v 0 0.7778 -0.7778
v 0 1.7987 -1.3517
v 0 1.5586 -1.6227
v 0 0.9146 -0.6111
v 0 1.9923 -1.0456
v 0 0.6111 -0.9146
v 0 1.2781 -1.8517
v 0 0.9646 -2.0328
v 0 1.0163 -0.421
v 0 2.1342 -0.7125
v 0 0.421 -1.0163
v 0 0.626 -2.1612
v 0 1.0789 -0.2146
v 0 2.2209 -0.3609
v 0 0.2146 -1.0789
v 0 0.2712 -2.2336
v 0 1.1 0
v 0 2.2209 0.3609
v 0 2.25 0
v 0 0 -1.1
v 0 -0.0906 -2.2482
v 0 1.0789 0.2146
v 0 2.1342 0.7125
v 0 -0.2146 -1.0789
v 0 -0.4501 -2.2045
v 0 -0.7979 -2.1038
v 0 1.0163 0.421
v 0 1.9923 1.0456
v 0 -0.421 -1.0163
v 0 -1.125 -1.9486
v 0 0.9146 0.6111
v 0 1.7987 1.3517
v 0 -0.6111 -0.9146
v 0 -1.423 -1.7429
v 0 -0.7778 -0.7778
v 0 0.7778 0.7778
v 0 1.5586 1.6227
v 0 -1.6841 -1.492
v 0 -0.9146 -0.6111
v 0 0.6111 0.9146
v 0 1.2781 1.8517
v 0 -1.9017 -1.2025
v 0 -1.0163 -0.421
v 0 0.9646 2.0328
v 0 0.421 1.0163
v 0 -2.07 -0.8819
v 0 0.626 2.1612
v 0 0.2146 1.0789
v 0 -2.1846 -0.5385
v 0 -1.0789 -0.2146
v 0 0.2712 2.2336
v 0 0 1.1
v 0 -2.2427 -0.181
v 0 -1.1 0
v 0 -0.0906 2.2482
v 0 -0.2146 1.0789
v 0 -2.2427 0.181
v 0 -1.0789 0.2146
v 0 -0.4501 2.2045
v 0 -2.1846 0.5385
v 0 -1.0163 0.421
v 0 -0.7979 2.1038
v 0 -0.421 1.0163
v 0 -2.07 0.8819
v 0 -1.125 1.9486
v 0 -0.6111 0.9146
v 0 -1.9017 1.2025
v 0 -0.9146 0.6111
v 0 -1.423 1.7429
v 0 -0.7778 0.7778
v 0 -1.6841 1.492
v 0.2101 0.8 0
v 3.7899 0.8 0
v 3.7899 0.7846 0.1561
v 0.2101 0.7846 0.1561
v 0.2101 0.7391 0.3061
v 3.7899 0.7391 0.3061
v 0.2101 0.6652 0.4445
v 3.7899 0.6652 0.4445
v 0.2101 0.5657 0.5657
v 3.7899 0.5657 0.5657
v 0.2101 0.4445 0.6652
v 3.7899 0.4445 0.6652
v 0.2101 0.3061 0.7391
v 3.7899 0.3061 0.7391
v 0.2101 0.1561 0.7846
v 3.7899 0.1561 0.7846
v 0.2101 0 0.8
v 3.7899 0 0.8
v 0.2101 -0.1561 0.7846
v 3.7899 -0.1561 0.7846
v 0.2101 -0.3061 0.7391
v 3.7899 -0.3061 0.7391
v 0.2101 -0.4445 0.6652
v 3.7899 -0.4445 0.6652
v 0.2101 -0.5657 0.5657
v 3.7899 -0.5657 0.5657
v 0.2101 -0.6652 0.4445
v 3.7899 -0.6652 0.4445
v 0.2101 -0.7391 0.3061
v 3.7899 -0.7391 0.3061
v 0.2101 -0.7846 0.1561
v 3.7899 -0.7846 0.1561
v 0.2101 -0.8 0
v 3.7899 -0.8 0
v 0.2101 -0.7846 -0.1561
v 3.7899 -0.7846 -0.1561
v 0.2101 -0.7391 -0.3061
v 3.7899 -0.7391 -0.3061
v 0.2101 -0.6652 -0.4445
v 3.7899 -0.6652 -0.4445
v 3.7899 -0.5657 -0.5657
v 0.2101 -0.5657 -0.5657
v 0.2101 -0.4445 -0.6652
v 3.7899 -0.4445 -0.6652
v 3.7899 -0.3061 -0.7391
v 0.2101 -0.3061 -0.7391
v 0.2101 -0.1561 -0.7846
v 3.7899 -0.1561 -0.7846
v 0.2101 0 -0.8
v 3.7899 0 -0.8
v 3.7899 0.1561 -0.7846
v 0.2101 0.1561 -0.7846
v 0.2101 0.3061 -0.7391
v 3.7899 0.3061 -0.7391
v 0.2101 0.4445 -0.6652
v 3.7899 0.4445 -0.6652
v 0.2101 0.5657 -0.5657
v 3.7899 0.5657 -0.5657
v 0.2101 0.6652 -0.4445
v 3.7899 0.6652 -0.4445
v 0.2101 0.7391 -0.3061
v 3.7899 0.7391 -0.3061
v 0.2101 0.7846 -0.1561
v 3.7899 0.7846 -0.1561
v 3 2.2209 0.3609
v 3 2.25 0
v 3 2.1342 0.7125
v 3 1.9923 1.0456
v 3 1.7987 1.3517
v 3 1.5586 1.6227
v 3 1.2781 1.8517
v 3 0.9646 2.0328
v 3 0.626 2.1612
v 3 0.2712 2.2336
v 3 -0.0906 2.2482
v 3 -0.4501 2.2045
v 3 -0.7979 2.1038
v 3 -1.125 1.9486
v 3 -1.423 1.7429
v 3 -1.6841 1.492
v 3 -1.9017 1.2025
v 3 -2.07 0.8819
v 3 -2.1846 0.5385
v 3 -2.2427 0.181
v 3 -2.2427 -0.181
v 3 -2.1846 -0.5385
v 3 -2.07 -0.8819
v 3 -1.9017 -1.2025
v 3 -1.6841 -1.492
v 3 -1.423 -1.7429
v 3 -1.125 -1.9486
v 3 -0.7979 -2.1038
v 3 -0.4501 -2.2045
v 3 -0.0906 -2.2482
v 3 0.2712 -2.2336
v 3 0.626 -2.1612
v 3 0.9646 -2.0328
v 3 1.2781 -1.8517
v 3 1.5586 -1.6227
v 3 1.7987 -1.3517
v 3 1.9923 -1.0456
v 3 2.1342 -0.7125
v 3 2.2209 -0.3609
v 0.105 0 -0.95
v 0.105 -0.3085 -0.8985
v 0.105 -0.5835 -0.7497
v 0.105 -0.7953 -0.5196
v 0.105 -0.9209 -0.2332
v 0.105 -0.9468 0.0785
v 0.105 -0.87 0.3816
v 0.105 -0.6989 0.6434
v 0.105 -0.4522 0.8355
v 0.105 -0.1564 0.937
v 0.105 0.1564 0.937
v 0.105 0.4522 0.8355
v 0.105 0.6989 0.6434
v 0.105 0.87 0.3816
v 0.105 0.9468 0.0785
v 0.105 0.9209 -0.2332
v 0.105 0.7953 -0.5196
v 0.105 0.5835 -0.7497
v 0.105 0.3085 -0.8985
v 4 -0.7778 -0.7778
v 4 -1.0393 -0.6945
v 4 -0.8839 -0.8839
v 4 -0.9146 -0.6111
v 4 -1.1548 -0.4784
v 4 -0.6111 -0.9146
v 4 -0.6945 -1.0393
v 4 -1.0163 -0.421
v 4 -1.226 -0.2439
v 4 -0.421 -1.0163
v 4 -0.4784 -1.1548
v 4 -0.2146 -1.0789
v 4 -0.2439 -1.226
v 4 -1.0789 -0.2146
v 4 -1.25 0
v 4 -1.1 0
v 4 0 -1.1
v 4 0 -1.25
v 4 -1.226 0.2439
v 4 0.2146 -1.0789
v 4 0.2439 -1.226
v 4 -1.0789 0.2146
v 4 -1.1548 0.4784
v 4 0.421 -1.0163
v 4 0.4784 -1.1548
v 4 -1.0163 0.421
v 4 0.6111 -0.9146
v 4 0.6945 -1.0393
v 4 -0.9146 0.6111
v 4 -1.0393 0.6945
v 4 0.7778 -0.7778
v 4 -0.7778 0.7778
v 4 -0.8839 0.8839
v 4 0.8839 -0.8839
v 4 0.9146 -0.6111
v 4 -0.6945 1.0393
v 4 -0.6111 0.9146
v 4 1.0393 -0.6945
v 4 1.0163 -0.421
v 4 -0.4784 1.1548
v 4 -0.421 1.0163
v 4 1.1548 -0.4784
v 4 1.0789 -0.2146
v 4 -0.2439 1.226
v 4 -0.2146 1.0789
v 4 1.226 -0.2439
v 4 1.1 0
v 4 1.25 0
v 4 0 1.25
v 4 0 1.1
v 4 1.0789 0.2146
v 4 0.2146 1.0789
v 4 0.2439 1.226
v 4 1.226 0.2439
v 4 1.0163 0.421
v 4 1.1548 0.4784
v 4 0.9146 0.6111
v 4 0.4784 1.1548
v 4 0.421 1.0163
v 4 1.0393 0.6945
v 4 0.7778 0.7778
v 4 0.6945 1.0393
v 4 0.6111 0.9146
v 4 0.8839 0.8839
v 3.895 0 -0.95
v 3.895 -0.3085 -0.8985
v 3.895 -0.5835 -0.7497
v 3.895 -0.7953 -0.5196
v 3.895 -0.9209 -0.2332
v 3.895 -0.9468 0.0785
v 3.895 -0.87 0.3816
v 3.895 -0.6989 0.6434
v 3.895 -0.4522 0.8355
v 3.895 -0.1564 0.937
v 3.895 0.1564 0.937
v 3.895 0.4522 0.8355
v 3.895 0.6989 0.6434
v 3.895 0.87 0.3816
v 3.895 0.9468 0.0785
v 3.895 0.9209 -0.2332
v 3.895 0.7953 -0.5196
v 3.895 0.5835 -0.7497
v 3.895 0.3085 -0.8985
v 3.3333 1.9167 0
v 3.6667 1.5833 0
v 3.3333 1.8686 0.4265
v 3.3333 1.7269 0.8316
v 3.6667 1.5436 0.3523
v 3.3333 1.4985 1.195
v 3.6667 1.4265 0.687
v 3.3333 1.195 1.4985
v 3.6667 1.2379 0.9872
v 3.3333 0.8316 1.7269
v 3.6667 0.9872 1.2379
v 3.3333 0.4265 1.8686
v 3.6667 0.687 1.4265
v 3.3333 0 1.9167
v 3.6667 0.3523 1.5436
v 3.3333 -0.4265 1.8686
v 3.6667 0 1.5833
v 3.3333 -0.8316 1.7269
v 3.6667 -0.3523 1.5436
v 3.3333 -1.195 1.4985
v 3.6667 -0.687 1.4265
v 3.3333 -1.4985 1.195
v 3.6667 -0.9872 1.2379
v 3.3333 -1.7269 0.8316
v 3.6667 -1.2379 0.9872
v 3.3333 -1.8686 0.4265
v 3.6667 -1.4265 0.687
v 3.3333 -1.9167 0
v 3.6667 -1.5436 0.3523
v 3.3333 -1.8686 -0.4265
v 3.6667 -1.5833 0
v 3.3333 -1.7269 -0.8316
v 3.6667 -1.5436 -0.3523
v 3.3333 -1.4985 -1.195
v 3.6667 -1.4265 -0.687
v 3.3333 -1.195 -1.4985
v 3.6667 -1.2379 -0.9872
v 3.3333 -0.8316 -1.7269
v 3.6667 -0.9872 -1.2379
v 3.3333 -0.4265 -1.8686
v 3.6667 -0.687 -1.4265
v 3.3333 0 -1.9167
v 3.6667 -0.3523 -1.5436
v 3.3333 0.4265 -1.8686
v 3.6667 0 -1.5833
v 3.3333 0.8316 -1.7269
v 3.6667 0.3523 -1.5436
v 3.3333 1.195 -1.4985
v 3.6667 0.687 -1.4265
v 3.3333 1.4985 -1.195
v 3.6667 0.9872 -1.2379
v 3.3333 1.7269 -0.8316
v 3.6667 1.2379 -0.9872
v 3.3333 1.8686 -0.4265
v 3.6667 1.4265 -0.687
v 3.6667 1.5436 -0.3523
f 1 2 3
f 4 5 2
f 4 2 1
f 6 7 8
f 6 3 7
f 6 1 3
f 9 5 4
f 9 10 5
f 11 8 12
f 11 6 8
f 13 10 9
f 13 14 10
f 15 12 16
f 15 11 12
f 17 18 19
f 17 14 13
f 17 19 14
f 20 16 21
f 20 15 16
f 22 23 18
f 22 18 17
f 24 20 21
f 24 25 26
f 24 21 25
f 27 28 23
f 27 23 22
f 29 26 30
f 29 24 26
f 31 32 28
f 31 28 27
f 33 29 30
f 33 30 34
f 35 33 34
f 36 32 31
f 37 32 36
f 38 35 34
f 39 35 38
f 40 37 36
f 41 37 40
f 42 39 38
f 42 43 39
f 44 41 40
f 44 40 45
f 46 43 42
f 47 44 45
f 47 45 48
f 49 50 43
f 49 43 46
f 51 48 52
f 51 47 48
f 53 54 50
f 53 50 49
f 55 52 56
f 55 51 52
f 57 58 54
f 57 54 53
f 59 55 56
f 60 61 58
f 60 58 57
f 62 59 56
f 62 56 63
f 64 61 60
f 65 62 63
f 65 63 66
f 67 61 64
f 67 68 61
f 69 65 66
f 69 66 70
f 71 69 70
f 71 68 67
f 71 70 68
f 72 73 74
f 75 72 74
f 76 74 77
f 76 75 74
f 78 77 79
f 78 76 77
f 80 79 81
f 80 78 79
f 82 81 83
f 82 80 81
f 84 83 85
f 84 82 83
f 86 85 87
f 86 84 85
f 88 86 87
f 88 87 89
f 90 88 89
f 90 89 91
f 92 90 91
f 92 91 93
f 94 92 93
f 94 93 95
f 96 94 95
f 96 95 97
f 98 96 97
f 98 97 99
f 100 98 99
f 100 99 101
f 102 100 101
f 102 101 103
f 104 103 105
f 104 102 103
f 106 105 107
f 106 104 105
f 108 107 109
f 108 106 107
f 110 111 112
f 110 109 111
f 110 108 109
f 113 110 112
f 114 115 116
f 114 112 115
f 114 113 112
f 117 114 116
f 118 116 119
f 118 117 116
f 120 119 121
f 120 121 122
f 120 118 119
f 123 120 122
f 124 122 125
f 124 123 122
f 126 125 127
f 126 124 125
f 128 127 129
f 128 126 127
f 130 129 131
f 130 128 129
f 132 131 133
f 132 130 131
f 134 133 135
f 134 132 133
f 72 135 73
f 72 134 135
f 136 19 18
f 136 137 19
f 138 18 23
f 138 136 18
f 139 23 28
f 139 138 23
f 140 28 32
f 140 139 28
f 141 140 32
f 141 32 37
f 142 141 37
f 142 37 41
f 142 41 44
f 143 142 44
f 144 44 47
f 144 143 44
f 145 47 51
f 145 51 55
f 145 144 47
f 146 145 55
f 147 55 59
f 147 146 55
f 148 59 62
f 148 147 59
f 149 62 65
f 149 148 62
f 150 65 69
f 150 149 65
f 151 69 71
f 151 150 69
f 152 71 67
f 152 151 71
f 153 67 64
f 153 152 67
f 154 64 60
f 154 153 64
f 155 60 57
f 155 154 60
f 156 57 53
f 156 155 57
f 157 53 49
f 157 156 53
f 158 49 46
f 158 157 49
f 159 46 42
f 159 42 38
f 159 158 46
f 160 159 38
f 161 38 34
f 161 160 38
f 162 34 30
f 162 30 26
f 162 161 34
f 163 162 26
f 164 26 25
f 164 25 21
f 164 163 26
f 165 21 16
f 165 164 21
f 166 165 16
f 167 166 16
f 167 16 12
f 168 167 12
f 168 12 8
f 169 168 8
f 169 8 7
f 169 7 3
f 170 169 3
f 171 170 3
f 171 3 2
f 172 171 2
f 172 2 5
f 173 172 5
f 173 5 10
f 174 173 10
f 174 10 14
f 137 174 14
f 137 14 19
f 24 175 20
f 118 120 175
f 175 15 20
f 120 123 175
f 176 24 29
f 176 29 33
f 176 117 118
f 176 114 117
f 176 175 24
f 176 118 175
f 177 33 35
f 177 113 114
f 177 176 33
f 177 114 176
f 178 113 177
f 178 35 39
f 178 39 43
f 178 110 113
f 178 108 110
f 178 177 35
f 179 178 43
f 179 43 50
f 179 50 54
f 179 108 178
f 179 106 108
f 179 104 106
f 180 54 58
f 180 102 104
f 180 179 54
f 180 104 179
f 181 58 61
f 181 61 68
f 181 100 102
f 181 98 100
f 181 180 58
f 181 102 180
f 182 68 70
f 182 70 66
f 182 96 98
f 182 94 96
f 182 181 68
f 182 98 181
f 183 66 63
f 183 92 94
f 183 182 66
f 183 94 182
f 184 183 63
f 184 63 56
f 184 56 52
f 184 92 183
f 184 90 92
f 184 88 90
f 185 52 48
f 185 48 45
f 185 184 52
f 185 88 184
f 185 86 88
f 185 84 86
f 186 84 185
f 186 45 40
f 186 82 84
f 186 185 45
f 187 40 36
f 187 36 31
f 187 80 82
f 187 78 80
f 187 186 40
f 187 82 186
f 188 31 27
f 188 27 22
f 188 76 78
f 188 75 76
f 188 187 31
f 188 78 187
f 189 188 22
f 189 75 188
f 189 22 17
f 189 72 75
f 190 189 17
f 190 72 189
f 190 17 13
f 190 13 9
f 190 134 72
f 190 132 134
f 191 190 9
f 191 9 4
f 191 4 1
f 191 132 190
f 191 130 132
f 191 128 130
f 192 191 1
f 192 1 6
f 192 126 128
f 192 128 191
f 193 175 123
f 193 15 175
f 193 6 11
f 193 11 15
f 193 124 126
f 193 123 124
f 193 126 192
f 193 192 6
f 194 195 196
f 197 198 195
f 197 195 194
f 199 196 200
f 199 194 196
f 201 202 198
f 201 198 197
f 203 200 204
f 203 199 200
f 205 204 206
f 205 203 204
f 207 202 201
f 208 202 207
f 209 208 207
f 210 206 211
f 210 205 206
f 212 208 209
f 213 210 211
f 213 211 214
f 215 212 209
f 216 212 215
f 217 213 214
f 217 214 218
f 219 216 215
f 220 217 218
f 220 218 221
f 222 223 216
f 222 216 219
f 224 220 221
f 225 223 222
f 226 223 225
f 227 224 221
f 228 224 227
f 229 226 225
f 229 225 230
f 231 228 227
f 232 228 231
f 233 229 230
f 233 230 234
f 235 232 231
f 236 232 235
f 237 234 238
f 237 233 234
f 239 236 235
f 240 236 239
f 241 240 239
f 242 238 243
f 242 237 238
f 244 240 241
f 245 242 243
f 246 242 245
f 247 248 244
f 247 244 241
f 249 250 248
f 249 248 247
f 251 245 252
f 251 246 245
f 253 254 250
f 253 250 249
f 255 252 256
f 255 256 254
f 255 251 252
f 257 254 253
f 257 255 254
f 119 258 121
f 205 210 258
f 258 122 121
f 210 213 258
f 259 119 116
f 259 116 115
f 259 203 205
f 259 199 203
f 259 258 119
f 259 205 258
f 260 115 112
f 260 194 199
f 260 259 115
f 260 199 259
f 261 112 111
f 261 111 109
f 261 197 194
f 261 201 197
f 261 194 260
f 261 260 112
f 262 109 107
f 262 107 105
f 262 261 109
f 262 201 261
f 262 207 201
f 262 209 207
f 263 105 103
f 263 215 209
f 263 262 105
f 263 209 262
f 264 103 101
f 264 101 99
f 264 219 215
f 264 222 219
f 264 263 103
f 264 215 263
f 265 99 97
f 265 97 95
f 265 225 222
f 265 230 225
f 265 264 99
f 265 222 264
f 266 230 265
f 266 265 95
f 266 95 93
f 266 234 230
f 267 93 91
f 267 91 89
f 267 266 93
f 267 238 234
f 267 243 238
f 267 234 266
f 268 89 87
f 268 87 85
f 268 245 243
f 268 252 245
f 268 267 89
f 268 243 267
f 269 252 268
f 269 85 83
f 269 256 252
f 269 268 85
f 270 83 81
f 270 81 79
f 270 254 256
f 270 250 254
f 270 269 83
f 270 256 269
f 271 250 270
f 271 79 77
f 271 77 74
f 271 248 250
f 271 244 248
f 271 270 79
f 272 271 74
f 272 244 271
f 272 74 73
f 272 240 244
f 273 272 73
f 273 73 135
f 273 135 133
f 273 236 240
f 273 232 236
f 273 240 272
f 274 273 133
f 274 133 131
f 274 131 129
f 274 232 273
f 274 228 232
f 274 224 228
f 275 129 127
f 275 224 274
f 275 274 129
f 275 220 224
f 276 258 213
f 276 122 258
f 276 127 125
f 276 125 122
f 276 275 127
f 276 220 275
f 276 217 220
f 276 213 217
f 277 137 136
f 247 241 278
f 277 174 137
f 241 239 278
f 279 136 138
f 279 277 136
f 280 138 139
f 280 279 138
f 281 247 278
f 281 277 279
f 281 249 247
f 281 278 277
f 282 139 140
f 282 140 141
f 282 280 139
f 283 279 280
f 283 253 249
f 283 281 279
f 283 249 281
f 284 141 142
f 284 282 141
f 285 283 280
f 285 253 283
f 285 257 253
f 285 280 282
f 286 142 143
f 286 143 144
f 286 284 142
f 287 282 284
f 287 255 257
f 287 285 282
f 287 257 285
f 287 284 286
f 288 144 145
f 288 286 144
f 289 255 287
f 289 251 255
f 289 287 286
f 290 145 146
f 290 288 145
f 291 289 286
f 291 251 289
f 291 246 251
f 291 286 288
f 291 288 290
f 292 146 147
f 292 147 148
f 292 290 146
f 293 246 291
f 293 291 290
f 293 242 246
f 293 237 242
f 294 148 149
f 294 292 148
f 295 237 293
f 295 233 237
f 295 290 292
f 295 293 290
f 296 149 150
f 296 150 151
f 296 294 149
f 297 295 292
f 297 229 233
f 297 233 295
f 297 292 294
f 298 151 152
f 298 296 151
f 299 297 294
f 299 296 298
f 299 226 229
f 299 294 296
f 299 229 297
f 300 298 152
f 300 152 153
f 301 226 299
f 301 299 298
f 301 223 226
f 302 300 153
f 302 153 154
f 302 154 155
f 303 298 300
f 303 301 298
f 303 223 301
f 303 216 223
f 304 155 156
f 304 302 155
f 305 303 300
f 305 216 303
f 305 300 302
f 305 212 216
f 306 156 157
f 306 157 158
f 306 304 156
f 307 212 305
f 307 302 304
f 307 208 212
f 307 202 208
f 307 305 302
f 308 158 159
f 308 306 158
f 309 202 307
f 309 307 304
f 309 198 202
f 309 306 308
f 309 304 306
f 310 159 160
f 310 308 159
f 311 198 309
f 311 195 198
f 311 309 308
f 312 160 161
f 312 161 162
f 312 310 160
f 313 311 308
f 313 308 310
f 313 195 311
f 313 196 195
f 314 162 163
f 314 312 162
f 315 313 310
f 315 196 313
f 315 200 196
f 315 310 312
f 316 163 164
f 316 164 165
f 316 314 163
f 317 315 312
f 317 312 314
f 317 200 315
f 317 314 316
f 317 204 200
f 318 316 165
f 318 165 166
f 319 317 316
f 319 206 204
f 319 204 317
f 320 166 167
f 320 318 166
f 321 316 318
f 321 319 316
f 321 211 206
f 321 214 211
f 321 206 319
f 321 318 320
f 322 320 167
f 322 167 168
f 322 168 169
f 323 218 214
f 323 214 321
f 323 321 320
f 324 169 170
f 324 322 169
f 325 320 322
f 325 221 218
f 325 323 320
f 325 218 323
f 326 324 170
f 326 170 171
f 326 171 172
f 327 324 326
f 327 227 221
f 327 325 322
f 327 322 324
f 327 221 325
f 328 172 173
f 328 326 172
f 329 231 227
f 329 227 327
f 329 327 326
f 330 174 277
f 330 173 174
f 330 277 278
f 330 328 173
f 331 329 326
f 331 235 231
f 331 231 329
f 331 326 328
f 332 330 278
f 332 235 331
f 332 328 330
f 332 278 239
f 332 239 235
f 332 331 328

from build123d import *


with BuildPart() as part:
    # Эскиз1 → Повернуть1 (revolve)
    with BuildSketch(Plane.XY):
        Polygon((0, 0.8), (0, 2.25), (3, 2.25), (4, 1.25), (4, 0.8), align=None)
    revolve(axis=Axis((0, 0, 0), (1, 0, 0)))

    # Эскиз2 → Отверстие обработанное метчиком M2x0.41 (revolve, cut)
    with BuildSketch(Plane(origin=(4, 0, 0), x_dir=(0, 0, -1), z_dir=(0, 1, 0))):
        Polygon((0, 0), (0, 4), (1.1, 4), (0.8, 3.789937739), (0.8, 0.210062261), (1.1, 0), align=None)
    revolve(axis=Axis((10.35, 0, 0), (-1, 0, 0)), mode=Mode.SUBTRACT)


solid = part.part
